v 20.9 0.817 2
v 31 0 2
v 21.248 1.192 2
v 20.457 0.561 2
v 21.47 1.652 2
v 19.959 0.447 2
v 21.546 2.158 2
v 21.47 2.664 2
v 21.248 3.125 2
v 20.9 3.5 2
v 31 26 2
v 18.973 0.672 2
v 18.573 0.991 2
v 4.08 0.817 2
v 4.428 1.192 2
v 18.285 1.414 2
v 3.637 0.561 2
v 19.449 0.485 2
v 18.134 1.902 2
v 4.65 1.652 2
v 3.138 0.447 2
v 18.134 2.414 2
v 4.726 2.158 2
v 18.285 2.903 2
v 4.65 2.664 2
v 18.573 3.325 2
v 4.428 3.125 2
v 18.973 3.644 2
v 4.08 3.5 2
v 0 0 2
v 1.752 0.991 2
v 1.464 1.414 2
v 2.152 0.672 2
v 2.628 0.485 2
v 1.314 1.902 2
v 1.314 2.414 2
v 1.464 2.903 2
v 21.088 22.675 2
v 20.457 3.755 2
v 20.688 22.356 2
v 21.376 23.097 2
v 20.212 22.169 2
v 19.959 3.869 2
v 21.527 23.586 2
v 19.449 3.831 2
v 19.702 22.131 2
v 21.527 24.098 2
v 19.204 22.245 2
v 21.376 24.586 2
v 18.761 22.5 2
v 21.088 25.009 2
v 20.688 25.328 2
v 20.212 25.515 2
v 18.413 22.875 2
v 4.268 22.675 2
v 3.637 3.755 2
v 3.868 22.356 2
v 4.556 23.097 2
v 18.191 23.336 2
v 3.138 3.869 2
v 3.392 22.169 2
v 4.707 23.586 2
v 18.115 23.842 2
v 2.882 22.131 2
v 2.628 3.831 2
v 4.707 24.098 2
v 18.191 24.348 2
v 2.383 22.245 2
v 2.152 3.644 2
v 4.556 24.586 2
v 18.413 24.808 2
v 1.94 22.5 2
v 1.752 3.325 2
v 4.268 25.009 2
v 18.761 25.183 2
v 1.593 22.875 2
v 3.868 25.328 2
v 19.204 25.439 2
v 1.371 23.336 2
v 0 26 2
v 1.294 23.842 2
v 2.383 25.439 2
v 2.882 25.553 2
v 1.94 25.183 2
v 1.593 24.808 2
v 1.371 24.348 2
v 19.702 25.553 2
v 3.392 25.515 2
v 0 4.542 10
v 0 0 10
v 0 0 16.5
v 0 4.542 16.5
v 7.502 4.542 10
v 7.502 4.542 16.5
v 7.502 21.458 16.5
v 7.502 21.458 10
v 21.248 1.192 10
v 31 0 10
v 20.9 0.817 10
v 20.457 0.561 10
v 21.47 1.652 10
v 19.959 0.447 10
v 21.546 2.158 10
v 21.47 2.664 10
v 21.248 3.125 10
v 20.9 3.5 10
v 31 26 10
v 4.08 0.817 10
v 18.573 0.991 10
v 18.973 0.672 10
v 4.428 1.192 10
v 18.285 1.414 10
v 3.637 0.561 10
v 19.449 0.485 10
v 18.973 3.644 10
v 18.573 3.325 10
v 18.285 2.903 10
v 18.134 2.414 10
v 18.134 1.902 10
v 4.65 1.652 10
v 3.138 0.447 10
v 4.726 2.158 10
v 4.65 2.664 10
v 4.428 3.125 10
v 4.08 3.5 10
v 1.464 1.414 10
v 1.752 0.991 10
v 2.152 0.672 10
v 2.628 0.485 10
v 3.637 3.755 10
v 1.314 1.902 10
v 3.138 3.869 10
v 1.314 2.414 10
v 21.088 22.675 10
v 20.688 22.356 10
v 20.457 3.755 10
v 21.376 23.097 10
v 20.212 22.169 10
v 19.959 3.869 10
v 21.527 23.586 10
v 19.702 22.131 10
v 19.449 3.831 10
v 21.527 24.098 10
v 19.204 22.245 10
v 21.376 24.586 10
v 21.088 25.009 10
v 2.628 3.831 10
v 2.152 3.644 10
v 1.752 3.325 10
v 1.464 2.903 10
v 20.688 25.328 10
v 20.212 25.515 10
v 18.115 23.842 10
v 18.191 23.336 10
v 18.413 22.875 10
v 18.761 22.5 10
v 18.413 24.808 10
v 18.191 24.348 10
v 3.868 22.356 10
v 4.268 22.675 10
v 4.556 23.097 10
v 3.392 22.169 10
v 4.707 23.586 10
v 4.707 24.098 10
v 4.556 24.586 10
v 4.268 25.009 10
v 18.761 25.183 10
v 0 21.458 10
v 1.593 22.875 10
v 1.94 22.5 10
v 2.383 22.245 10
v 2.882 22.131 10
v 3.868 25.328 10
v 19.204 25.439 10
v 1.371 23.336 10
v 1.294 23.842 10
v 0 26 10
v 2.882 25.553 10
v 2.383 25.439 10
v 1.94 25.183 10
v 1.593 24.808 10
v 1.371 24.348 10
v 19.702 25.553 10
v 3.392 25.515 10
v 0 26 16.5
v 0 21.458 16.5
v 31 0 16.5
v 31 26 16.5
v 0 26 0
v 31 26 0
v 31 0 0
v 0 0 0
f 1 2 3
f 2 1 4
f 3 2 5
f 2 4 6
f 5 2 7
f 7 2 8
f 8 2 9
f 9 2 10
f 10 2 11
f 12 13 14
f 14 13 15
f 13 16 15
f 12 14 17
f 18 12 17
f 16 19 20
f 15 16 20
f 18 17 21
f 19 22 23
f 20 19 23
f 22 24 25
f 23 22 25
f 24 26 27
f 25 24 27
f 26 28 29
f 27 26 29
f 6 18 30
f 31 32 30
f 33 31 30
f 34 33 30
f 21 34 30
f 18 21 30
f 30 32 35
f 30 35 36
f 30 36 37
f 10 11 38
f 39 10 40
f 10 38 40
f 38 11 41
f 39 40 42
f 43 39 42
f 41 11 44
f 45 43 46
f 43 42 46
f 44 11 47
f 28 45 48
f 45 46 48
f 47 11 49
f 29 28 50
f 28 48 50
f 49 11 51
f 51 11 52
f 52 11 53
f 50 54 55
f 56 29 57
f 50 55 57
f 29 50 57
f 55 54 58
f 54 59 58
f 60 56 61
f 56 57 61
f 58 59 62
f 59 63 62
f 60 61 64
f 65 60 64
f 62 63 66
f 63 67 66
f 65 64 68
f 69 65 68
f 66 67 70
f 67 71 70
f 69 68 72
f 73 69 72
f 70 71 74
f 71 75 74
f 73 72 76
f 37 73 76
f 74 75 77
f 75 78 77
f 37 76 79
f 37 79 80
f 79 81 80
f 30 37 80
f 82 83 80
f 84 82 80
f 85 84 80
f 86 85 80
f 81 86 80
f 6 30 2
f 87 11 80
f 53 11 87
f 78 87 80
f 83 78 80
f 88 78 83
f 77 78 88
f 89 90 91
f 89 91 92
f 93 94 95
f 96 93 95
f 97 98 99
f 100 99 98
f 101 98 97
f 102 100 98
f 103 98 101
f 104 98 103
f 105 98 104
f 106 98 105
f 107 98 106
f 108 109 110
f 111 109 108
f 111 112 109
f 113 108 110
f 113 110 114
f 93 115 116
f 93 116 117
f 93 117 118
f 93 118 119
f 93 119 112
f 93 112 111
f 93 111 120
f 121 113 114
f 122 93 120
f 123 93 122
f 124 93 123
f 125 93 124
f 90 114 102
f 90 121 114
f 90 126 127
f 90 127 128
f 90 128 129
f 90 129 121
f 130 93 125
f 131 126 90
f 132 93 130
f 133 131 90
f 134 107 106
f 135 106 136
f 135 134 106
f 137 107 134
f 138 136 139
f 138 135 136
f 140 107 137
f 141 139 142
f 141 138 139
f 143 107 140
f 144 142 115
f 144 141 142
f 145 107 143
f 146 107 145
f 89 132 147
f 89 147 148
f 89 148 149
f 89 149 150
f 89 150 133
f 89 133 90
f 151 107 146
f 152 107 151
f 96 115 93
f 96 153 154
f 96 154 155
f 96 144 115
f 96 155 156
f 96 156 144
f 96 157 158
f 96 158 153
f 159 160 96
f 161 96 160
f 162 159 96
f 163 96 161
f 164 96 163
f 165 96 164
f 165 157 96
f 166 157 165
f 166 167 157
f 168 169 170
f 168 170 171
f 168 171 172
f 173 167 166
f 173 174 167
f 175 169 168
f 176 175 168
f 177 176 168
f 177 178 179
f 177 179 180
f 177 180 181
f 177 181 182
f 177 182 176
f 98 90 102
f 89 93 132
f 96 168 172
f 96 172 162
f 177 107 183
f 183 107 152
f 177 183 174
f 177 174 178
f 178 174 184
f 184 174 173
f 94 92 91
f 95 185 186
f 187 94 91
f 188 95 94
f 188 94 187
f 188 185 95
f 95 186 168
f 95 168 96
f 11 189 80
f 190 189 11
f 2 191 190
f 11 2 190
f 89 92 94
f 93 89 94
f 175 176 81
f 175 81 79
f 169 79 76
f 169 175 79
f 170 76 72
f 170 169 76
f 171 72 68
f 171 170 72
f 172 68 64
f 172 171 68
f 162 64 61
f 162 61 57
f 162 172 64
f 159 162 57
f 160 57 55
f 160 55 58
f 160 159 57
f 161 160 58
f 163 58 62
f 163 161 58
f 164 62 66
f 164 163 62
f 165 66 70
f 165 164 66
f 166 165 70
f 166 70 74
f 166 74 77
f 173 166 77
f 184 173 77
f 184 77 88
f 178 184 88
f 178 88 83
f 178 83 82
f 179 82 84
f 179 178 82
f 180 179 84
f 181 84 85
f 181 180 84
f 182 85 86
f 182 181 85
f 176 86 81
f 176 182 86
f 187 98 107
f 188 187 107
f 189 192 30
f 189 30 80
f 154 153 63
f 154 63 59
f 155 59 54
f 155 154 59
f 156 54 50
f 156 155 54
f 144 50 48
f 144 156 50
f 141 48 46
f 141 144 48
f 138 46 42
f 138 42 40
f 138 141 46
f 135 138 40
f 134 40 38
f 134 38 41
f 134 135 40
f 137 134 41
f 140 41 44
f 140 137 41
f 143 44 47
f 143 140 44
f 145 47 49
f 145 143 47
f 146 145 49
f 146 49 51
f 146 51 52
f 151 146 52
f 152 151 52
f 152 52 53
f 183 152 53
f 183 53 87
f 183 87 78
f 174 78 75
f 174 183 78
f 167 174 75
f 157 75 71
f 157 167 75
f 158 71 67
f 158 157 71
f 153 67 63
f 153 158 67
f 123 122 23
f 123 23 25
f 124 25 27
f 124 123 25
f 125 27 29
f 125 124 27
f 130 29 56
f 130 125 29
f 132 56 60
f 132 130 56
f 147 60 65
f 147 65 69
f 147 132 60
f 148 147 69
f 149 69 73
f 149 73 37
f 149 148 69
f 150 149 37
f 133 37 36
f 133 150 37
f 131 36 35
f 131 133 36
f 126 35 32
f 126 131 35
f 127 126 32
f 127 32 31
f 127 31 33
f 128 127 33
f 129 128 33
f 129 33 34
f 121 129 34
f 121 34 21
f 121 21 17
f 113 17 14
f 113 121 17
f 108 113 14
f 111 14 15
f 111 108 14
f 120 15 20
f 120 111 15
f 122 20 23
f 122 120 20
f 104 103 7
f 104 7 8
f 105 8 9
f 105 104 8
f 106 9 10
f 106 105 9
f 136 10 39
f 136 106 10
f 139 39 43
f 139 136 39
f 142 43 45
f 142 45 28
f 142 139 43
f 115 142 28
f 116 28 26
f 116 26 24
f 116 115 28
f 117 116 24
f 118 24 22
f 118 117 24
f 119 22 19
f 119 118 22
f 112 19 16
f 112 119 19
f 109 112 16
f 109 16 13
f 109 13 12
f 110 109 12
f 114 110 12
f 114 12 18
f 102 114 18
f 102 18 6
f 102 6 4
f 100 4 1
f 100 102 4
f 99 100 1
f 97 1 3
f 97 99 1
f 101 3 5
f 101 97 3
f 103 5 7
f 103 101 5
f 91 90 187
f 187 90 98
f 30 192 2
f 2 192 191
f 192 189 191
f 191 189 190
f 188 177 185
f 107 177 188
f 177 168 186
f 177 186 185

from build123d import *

# Parameters (mm, degrees)
SKETCH1_W           = 31
SKETCH1_H           = 26
BOSS_EXTRUDE1_DEPTH = 16.5
CUT_EXTRUDE1_START  = -6.5
SKETCH3_R           = 1.715784354
CUT_EXTRUDE1_DEPTH  = 8
SKETCH4_W           = 7.501797644
SKETCH4_H           = 16.91664374
CUT_EXTRUDE2_DEPTH  = 14.5


with BuildPart() as part:
    # Sketch1 → Boss-Extrude1 (new body)
    with BuildSketch(Plane.XY):
        with Locations((15.5, 13)):
            Rectangle(SKETCH1_W, SKETCH1_H)
    extrude(amount=BOSS_EXTRUDE1_DEPTH)

    # Sketch3 → Cut-Extrude1 (cut)
    with BuildSketch(Plane.XY.offset(16.5).offset(CUT_EXTRUDE1_START)):
        Polygon((0, 0), (0, 4.632335589), (6.323496347, 4.632335589), (6.323496347, 21.367664411), (0, 21.367664411), (0, 26), (31, 26), (31, 0), align=None)
        with Locations((3.010252107, 2.158101323)):
            Circle(SKETCH3_R, mode=Mode.SUBTRACT)
        with Locations((19.83045716, 2.158101323)):
            Circle(SKETCH3_R, mode=Mode.SUBTRACT)
        with Locations(Location((3.010252107, 23.841898677, 0), (0, 0, 180))):
            Circle(SKETCH3_R, mode=Mode.SUBTRACT)
        with Locations(Location((19.83045716, 23.841898677, 0), (0, 0, 180))):
            Circle(SKETCH3_R, mode=Mode.SUBTRACT)
    extrude(amount=-CUT_EXTRUDE1_DEPTH, mode=Mode.SUBTRACT)

    # Sketch4 → Cut-Extrude2 (cut)
    with BuildSketch(Plane.XY.offset(16.5)):
        with Locations((3.750898822, 13)):
            Rectangle(SKETCH4_W, SKETCH4_H)
    extrude(amount=-CUT_EXTRUDE2_DEPTH, mode=Mode.SUBTRACT)


solid = part.part
